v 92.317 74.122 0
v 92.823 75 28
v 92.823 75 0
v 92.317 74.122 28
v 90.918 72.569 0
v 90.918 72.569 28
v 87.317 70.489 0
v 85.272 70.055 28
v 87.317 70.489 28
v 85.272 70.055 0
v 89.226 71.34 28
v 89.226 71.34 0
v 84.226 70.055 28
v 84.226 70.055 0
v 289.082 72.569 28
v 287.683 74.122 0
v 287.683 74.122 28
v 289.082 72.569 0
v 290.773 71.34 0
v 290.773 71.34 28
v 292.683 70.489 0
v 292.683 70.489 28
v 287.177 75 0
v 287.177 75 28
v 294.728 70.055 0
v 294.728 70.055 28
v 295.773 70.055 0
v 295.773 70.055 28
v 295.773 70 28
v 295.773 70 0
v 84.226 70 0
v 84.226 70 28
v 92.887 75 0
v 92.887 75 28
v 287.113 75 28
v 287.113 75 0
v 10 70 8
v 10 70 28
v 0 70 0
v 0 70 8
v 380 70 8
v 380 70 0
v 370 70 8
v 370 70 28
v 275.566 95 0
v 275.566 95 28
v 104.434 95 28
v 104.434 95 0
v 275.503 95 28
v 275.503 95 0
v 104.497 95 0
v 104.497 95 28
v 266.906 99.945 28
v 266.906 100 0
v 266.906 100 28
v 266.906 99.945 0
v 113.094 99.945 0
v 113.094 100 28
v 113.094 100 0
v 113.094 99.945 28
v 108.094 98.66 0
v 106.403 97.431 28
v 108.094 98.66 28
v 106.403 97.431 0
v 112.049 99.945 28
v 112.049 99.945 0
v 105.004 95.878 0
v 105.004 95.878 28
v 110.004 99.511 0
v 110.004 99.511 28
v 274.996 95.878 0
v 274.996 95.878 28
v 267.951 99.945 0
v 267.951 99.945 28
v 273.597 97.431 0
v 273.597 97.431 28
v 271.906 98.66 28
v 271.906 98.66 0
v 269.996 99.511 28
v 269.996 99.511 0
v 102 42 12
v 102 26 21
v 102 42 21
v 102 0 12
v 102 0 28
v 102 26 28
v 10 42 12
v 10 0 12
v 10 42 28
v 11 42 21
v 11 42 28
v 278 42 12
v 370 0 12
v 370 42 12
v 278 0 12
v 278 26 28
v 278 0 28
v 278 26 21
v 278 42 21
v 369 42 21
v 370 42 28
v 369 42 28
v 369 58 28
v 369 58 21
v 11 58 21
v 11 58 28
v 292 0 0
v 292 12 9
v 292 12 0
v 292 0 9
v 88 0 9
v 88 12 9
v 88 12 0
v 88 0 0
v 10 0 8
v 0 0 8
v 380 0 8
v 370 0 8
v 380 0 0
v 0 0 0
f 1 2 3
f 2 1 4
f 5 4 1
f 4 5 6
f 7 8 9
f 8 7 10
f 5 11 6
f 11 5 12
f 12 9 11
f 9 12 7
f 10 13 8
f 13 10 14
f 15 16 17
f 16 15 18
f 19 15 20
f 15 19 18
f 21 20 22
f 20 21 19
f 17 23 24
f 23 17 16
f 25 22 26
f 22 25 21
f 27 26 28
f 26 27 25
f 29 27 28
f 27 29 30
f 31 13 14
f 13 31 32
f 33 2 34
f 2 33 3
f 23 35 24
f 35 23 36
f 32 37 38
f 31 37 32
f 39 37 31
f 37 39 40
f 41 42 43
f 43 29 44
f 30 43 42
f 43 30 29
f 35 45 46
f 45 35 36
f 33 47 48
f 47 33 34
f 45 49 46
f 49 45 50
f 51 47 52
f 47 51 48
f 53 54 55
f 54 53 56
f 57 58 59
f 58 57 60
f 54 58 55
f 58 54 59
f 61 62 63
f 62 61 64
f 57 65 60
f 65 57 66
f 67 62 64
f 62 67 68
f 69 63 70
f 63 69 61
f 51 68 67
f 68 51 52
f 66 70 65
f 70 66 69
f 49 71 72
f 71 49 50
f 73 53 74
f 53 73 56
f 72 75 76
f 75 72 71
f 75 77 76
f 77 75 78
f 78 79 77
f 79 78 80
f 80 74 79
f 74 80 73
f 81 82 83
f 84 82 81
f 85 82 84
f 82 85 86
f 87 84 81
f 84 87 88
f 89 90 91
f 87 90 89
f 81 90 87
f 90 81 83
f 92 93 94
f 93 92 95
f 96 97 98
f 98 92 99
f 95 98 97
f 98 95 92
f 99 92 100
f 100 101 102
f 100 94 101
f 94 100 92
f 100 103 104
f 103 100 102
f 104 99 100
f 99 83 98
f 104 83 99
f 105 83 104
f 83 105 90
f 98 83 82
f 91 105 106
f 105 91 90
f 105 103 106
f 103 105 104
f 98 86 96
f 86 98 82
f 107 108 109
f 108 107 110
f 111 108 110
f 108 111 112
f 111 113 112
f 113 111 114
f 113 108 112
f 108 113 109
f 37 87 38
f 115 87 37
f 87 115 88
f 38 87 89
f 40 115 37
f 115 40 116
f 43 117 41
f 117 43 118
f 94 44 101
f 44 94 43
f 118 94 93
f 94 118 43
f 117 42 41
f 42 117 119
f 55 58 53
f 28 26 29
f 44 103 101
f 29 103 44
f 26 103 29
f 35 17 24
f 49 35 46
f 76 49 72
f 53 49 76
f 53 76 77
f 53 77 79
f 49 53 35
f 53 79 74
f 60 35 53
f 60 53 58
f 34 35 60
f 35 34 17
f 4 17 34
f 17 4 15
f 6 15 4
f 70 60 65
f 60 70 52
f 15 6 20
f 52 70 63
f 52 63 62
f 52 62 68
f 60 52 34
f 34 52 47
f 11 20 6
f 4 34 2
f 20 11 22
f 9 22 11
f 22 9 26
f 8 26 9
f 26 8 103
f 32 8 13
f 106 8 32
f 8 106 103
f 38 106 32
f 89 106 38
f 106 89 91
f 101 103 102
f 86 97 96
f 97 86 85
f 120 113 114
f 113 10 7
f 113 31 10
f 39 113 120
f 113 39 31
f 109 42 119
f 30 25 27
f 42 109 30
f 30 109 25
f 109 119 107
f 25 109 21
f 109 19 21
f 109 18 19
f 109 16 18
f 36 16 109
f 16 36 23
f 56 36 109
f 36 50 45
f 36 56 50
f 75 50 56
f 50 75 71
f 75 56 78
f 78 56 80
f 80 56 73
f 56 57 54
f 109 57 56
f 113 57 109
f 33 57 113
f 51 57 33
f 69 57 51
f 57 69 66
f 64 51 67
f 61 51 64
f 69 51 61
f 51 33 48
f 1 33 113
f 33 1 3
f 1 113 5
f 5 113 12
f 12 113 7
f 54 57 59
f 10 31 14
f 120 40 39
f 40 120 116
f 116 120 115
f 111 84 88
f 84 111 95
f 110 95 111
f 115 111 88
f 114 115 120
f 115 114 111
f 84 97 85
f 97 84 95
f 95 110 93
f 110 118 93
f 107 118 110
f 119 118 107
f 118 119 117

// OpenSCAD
include <../src/wardrobe.scad>;
plank_yz_side_top();
//github_openscad -o wardrobe_1/plank_yz_side_top.stl -D wardrobe_n=1 -D cutting_edge=0 -D break_view_length=0 wardrobe_1/plank_yz_side_top_stl.scad
